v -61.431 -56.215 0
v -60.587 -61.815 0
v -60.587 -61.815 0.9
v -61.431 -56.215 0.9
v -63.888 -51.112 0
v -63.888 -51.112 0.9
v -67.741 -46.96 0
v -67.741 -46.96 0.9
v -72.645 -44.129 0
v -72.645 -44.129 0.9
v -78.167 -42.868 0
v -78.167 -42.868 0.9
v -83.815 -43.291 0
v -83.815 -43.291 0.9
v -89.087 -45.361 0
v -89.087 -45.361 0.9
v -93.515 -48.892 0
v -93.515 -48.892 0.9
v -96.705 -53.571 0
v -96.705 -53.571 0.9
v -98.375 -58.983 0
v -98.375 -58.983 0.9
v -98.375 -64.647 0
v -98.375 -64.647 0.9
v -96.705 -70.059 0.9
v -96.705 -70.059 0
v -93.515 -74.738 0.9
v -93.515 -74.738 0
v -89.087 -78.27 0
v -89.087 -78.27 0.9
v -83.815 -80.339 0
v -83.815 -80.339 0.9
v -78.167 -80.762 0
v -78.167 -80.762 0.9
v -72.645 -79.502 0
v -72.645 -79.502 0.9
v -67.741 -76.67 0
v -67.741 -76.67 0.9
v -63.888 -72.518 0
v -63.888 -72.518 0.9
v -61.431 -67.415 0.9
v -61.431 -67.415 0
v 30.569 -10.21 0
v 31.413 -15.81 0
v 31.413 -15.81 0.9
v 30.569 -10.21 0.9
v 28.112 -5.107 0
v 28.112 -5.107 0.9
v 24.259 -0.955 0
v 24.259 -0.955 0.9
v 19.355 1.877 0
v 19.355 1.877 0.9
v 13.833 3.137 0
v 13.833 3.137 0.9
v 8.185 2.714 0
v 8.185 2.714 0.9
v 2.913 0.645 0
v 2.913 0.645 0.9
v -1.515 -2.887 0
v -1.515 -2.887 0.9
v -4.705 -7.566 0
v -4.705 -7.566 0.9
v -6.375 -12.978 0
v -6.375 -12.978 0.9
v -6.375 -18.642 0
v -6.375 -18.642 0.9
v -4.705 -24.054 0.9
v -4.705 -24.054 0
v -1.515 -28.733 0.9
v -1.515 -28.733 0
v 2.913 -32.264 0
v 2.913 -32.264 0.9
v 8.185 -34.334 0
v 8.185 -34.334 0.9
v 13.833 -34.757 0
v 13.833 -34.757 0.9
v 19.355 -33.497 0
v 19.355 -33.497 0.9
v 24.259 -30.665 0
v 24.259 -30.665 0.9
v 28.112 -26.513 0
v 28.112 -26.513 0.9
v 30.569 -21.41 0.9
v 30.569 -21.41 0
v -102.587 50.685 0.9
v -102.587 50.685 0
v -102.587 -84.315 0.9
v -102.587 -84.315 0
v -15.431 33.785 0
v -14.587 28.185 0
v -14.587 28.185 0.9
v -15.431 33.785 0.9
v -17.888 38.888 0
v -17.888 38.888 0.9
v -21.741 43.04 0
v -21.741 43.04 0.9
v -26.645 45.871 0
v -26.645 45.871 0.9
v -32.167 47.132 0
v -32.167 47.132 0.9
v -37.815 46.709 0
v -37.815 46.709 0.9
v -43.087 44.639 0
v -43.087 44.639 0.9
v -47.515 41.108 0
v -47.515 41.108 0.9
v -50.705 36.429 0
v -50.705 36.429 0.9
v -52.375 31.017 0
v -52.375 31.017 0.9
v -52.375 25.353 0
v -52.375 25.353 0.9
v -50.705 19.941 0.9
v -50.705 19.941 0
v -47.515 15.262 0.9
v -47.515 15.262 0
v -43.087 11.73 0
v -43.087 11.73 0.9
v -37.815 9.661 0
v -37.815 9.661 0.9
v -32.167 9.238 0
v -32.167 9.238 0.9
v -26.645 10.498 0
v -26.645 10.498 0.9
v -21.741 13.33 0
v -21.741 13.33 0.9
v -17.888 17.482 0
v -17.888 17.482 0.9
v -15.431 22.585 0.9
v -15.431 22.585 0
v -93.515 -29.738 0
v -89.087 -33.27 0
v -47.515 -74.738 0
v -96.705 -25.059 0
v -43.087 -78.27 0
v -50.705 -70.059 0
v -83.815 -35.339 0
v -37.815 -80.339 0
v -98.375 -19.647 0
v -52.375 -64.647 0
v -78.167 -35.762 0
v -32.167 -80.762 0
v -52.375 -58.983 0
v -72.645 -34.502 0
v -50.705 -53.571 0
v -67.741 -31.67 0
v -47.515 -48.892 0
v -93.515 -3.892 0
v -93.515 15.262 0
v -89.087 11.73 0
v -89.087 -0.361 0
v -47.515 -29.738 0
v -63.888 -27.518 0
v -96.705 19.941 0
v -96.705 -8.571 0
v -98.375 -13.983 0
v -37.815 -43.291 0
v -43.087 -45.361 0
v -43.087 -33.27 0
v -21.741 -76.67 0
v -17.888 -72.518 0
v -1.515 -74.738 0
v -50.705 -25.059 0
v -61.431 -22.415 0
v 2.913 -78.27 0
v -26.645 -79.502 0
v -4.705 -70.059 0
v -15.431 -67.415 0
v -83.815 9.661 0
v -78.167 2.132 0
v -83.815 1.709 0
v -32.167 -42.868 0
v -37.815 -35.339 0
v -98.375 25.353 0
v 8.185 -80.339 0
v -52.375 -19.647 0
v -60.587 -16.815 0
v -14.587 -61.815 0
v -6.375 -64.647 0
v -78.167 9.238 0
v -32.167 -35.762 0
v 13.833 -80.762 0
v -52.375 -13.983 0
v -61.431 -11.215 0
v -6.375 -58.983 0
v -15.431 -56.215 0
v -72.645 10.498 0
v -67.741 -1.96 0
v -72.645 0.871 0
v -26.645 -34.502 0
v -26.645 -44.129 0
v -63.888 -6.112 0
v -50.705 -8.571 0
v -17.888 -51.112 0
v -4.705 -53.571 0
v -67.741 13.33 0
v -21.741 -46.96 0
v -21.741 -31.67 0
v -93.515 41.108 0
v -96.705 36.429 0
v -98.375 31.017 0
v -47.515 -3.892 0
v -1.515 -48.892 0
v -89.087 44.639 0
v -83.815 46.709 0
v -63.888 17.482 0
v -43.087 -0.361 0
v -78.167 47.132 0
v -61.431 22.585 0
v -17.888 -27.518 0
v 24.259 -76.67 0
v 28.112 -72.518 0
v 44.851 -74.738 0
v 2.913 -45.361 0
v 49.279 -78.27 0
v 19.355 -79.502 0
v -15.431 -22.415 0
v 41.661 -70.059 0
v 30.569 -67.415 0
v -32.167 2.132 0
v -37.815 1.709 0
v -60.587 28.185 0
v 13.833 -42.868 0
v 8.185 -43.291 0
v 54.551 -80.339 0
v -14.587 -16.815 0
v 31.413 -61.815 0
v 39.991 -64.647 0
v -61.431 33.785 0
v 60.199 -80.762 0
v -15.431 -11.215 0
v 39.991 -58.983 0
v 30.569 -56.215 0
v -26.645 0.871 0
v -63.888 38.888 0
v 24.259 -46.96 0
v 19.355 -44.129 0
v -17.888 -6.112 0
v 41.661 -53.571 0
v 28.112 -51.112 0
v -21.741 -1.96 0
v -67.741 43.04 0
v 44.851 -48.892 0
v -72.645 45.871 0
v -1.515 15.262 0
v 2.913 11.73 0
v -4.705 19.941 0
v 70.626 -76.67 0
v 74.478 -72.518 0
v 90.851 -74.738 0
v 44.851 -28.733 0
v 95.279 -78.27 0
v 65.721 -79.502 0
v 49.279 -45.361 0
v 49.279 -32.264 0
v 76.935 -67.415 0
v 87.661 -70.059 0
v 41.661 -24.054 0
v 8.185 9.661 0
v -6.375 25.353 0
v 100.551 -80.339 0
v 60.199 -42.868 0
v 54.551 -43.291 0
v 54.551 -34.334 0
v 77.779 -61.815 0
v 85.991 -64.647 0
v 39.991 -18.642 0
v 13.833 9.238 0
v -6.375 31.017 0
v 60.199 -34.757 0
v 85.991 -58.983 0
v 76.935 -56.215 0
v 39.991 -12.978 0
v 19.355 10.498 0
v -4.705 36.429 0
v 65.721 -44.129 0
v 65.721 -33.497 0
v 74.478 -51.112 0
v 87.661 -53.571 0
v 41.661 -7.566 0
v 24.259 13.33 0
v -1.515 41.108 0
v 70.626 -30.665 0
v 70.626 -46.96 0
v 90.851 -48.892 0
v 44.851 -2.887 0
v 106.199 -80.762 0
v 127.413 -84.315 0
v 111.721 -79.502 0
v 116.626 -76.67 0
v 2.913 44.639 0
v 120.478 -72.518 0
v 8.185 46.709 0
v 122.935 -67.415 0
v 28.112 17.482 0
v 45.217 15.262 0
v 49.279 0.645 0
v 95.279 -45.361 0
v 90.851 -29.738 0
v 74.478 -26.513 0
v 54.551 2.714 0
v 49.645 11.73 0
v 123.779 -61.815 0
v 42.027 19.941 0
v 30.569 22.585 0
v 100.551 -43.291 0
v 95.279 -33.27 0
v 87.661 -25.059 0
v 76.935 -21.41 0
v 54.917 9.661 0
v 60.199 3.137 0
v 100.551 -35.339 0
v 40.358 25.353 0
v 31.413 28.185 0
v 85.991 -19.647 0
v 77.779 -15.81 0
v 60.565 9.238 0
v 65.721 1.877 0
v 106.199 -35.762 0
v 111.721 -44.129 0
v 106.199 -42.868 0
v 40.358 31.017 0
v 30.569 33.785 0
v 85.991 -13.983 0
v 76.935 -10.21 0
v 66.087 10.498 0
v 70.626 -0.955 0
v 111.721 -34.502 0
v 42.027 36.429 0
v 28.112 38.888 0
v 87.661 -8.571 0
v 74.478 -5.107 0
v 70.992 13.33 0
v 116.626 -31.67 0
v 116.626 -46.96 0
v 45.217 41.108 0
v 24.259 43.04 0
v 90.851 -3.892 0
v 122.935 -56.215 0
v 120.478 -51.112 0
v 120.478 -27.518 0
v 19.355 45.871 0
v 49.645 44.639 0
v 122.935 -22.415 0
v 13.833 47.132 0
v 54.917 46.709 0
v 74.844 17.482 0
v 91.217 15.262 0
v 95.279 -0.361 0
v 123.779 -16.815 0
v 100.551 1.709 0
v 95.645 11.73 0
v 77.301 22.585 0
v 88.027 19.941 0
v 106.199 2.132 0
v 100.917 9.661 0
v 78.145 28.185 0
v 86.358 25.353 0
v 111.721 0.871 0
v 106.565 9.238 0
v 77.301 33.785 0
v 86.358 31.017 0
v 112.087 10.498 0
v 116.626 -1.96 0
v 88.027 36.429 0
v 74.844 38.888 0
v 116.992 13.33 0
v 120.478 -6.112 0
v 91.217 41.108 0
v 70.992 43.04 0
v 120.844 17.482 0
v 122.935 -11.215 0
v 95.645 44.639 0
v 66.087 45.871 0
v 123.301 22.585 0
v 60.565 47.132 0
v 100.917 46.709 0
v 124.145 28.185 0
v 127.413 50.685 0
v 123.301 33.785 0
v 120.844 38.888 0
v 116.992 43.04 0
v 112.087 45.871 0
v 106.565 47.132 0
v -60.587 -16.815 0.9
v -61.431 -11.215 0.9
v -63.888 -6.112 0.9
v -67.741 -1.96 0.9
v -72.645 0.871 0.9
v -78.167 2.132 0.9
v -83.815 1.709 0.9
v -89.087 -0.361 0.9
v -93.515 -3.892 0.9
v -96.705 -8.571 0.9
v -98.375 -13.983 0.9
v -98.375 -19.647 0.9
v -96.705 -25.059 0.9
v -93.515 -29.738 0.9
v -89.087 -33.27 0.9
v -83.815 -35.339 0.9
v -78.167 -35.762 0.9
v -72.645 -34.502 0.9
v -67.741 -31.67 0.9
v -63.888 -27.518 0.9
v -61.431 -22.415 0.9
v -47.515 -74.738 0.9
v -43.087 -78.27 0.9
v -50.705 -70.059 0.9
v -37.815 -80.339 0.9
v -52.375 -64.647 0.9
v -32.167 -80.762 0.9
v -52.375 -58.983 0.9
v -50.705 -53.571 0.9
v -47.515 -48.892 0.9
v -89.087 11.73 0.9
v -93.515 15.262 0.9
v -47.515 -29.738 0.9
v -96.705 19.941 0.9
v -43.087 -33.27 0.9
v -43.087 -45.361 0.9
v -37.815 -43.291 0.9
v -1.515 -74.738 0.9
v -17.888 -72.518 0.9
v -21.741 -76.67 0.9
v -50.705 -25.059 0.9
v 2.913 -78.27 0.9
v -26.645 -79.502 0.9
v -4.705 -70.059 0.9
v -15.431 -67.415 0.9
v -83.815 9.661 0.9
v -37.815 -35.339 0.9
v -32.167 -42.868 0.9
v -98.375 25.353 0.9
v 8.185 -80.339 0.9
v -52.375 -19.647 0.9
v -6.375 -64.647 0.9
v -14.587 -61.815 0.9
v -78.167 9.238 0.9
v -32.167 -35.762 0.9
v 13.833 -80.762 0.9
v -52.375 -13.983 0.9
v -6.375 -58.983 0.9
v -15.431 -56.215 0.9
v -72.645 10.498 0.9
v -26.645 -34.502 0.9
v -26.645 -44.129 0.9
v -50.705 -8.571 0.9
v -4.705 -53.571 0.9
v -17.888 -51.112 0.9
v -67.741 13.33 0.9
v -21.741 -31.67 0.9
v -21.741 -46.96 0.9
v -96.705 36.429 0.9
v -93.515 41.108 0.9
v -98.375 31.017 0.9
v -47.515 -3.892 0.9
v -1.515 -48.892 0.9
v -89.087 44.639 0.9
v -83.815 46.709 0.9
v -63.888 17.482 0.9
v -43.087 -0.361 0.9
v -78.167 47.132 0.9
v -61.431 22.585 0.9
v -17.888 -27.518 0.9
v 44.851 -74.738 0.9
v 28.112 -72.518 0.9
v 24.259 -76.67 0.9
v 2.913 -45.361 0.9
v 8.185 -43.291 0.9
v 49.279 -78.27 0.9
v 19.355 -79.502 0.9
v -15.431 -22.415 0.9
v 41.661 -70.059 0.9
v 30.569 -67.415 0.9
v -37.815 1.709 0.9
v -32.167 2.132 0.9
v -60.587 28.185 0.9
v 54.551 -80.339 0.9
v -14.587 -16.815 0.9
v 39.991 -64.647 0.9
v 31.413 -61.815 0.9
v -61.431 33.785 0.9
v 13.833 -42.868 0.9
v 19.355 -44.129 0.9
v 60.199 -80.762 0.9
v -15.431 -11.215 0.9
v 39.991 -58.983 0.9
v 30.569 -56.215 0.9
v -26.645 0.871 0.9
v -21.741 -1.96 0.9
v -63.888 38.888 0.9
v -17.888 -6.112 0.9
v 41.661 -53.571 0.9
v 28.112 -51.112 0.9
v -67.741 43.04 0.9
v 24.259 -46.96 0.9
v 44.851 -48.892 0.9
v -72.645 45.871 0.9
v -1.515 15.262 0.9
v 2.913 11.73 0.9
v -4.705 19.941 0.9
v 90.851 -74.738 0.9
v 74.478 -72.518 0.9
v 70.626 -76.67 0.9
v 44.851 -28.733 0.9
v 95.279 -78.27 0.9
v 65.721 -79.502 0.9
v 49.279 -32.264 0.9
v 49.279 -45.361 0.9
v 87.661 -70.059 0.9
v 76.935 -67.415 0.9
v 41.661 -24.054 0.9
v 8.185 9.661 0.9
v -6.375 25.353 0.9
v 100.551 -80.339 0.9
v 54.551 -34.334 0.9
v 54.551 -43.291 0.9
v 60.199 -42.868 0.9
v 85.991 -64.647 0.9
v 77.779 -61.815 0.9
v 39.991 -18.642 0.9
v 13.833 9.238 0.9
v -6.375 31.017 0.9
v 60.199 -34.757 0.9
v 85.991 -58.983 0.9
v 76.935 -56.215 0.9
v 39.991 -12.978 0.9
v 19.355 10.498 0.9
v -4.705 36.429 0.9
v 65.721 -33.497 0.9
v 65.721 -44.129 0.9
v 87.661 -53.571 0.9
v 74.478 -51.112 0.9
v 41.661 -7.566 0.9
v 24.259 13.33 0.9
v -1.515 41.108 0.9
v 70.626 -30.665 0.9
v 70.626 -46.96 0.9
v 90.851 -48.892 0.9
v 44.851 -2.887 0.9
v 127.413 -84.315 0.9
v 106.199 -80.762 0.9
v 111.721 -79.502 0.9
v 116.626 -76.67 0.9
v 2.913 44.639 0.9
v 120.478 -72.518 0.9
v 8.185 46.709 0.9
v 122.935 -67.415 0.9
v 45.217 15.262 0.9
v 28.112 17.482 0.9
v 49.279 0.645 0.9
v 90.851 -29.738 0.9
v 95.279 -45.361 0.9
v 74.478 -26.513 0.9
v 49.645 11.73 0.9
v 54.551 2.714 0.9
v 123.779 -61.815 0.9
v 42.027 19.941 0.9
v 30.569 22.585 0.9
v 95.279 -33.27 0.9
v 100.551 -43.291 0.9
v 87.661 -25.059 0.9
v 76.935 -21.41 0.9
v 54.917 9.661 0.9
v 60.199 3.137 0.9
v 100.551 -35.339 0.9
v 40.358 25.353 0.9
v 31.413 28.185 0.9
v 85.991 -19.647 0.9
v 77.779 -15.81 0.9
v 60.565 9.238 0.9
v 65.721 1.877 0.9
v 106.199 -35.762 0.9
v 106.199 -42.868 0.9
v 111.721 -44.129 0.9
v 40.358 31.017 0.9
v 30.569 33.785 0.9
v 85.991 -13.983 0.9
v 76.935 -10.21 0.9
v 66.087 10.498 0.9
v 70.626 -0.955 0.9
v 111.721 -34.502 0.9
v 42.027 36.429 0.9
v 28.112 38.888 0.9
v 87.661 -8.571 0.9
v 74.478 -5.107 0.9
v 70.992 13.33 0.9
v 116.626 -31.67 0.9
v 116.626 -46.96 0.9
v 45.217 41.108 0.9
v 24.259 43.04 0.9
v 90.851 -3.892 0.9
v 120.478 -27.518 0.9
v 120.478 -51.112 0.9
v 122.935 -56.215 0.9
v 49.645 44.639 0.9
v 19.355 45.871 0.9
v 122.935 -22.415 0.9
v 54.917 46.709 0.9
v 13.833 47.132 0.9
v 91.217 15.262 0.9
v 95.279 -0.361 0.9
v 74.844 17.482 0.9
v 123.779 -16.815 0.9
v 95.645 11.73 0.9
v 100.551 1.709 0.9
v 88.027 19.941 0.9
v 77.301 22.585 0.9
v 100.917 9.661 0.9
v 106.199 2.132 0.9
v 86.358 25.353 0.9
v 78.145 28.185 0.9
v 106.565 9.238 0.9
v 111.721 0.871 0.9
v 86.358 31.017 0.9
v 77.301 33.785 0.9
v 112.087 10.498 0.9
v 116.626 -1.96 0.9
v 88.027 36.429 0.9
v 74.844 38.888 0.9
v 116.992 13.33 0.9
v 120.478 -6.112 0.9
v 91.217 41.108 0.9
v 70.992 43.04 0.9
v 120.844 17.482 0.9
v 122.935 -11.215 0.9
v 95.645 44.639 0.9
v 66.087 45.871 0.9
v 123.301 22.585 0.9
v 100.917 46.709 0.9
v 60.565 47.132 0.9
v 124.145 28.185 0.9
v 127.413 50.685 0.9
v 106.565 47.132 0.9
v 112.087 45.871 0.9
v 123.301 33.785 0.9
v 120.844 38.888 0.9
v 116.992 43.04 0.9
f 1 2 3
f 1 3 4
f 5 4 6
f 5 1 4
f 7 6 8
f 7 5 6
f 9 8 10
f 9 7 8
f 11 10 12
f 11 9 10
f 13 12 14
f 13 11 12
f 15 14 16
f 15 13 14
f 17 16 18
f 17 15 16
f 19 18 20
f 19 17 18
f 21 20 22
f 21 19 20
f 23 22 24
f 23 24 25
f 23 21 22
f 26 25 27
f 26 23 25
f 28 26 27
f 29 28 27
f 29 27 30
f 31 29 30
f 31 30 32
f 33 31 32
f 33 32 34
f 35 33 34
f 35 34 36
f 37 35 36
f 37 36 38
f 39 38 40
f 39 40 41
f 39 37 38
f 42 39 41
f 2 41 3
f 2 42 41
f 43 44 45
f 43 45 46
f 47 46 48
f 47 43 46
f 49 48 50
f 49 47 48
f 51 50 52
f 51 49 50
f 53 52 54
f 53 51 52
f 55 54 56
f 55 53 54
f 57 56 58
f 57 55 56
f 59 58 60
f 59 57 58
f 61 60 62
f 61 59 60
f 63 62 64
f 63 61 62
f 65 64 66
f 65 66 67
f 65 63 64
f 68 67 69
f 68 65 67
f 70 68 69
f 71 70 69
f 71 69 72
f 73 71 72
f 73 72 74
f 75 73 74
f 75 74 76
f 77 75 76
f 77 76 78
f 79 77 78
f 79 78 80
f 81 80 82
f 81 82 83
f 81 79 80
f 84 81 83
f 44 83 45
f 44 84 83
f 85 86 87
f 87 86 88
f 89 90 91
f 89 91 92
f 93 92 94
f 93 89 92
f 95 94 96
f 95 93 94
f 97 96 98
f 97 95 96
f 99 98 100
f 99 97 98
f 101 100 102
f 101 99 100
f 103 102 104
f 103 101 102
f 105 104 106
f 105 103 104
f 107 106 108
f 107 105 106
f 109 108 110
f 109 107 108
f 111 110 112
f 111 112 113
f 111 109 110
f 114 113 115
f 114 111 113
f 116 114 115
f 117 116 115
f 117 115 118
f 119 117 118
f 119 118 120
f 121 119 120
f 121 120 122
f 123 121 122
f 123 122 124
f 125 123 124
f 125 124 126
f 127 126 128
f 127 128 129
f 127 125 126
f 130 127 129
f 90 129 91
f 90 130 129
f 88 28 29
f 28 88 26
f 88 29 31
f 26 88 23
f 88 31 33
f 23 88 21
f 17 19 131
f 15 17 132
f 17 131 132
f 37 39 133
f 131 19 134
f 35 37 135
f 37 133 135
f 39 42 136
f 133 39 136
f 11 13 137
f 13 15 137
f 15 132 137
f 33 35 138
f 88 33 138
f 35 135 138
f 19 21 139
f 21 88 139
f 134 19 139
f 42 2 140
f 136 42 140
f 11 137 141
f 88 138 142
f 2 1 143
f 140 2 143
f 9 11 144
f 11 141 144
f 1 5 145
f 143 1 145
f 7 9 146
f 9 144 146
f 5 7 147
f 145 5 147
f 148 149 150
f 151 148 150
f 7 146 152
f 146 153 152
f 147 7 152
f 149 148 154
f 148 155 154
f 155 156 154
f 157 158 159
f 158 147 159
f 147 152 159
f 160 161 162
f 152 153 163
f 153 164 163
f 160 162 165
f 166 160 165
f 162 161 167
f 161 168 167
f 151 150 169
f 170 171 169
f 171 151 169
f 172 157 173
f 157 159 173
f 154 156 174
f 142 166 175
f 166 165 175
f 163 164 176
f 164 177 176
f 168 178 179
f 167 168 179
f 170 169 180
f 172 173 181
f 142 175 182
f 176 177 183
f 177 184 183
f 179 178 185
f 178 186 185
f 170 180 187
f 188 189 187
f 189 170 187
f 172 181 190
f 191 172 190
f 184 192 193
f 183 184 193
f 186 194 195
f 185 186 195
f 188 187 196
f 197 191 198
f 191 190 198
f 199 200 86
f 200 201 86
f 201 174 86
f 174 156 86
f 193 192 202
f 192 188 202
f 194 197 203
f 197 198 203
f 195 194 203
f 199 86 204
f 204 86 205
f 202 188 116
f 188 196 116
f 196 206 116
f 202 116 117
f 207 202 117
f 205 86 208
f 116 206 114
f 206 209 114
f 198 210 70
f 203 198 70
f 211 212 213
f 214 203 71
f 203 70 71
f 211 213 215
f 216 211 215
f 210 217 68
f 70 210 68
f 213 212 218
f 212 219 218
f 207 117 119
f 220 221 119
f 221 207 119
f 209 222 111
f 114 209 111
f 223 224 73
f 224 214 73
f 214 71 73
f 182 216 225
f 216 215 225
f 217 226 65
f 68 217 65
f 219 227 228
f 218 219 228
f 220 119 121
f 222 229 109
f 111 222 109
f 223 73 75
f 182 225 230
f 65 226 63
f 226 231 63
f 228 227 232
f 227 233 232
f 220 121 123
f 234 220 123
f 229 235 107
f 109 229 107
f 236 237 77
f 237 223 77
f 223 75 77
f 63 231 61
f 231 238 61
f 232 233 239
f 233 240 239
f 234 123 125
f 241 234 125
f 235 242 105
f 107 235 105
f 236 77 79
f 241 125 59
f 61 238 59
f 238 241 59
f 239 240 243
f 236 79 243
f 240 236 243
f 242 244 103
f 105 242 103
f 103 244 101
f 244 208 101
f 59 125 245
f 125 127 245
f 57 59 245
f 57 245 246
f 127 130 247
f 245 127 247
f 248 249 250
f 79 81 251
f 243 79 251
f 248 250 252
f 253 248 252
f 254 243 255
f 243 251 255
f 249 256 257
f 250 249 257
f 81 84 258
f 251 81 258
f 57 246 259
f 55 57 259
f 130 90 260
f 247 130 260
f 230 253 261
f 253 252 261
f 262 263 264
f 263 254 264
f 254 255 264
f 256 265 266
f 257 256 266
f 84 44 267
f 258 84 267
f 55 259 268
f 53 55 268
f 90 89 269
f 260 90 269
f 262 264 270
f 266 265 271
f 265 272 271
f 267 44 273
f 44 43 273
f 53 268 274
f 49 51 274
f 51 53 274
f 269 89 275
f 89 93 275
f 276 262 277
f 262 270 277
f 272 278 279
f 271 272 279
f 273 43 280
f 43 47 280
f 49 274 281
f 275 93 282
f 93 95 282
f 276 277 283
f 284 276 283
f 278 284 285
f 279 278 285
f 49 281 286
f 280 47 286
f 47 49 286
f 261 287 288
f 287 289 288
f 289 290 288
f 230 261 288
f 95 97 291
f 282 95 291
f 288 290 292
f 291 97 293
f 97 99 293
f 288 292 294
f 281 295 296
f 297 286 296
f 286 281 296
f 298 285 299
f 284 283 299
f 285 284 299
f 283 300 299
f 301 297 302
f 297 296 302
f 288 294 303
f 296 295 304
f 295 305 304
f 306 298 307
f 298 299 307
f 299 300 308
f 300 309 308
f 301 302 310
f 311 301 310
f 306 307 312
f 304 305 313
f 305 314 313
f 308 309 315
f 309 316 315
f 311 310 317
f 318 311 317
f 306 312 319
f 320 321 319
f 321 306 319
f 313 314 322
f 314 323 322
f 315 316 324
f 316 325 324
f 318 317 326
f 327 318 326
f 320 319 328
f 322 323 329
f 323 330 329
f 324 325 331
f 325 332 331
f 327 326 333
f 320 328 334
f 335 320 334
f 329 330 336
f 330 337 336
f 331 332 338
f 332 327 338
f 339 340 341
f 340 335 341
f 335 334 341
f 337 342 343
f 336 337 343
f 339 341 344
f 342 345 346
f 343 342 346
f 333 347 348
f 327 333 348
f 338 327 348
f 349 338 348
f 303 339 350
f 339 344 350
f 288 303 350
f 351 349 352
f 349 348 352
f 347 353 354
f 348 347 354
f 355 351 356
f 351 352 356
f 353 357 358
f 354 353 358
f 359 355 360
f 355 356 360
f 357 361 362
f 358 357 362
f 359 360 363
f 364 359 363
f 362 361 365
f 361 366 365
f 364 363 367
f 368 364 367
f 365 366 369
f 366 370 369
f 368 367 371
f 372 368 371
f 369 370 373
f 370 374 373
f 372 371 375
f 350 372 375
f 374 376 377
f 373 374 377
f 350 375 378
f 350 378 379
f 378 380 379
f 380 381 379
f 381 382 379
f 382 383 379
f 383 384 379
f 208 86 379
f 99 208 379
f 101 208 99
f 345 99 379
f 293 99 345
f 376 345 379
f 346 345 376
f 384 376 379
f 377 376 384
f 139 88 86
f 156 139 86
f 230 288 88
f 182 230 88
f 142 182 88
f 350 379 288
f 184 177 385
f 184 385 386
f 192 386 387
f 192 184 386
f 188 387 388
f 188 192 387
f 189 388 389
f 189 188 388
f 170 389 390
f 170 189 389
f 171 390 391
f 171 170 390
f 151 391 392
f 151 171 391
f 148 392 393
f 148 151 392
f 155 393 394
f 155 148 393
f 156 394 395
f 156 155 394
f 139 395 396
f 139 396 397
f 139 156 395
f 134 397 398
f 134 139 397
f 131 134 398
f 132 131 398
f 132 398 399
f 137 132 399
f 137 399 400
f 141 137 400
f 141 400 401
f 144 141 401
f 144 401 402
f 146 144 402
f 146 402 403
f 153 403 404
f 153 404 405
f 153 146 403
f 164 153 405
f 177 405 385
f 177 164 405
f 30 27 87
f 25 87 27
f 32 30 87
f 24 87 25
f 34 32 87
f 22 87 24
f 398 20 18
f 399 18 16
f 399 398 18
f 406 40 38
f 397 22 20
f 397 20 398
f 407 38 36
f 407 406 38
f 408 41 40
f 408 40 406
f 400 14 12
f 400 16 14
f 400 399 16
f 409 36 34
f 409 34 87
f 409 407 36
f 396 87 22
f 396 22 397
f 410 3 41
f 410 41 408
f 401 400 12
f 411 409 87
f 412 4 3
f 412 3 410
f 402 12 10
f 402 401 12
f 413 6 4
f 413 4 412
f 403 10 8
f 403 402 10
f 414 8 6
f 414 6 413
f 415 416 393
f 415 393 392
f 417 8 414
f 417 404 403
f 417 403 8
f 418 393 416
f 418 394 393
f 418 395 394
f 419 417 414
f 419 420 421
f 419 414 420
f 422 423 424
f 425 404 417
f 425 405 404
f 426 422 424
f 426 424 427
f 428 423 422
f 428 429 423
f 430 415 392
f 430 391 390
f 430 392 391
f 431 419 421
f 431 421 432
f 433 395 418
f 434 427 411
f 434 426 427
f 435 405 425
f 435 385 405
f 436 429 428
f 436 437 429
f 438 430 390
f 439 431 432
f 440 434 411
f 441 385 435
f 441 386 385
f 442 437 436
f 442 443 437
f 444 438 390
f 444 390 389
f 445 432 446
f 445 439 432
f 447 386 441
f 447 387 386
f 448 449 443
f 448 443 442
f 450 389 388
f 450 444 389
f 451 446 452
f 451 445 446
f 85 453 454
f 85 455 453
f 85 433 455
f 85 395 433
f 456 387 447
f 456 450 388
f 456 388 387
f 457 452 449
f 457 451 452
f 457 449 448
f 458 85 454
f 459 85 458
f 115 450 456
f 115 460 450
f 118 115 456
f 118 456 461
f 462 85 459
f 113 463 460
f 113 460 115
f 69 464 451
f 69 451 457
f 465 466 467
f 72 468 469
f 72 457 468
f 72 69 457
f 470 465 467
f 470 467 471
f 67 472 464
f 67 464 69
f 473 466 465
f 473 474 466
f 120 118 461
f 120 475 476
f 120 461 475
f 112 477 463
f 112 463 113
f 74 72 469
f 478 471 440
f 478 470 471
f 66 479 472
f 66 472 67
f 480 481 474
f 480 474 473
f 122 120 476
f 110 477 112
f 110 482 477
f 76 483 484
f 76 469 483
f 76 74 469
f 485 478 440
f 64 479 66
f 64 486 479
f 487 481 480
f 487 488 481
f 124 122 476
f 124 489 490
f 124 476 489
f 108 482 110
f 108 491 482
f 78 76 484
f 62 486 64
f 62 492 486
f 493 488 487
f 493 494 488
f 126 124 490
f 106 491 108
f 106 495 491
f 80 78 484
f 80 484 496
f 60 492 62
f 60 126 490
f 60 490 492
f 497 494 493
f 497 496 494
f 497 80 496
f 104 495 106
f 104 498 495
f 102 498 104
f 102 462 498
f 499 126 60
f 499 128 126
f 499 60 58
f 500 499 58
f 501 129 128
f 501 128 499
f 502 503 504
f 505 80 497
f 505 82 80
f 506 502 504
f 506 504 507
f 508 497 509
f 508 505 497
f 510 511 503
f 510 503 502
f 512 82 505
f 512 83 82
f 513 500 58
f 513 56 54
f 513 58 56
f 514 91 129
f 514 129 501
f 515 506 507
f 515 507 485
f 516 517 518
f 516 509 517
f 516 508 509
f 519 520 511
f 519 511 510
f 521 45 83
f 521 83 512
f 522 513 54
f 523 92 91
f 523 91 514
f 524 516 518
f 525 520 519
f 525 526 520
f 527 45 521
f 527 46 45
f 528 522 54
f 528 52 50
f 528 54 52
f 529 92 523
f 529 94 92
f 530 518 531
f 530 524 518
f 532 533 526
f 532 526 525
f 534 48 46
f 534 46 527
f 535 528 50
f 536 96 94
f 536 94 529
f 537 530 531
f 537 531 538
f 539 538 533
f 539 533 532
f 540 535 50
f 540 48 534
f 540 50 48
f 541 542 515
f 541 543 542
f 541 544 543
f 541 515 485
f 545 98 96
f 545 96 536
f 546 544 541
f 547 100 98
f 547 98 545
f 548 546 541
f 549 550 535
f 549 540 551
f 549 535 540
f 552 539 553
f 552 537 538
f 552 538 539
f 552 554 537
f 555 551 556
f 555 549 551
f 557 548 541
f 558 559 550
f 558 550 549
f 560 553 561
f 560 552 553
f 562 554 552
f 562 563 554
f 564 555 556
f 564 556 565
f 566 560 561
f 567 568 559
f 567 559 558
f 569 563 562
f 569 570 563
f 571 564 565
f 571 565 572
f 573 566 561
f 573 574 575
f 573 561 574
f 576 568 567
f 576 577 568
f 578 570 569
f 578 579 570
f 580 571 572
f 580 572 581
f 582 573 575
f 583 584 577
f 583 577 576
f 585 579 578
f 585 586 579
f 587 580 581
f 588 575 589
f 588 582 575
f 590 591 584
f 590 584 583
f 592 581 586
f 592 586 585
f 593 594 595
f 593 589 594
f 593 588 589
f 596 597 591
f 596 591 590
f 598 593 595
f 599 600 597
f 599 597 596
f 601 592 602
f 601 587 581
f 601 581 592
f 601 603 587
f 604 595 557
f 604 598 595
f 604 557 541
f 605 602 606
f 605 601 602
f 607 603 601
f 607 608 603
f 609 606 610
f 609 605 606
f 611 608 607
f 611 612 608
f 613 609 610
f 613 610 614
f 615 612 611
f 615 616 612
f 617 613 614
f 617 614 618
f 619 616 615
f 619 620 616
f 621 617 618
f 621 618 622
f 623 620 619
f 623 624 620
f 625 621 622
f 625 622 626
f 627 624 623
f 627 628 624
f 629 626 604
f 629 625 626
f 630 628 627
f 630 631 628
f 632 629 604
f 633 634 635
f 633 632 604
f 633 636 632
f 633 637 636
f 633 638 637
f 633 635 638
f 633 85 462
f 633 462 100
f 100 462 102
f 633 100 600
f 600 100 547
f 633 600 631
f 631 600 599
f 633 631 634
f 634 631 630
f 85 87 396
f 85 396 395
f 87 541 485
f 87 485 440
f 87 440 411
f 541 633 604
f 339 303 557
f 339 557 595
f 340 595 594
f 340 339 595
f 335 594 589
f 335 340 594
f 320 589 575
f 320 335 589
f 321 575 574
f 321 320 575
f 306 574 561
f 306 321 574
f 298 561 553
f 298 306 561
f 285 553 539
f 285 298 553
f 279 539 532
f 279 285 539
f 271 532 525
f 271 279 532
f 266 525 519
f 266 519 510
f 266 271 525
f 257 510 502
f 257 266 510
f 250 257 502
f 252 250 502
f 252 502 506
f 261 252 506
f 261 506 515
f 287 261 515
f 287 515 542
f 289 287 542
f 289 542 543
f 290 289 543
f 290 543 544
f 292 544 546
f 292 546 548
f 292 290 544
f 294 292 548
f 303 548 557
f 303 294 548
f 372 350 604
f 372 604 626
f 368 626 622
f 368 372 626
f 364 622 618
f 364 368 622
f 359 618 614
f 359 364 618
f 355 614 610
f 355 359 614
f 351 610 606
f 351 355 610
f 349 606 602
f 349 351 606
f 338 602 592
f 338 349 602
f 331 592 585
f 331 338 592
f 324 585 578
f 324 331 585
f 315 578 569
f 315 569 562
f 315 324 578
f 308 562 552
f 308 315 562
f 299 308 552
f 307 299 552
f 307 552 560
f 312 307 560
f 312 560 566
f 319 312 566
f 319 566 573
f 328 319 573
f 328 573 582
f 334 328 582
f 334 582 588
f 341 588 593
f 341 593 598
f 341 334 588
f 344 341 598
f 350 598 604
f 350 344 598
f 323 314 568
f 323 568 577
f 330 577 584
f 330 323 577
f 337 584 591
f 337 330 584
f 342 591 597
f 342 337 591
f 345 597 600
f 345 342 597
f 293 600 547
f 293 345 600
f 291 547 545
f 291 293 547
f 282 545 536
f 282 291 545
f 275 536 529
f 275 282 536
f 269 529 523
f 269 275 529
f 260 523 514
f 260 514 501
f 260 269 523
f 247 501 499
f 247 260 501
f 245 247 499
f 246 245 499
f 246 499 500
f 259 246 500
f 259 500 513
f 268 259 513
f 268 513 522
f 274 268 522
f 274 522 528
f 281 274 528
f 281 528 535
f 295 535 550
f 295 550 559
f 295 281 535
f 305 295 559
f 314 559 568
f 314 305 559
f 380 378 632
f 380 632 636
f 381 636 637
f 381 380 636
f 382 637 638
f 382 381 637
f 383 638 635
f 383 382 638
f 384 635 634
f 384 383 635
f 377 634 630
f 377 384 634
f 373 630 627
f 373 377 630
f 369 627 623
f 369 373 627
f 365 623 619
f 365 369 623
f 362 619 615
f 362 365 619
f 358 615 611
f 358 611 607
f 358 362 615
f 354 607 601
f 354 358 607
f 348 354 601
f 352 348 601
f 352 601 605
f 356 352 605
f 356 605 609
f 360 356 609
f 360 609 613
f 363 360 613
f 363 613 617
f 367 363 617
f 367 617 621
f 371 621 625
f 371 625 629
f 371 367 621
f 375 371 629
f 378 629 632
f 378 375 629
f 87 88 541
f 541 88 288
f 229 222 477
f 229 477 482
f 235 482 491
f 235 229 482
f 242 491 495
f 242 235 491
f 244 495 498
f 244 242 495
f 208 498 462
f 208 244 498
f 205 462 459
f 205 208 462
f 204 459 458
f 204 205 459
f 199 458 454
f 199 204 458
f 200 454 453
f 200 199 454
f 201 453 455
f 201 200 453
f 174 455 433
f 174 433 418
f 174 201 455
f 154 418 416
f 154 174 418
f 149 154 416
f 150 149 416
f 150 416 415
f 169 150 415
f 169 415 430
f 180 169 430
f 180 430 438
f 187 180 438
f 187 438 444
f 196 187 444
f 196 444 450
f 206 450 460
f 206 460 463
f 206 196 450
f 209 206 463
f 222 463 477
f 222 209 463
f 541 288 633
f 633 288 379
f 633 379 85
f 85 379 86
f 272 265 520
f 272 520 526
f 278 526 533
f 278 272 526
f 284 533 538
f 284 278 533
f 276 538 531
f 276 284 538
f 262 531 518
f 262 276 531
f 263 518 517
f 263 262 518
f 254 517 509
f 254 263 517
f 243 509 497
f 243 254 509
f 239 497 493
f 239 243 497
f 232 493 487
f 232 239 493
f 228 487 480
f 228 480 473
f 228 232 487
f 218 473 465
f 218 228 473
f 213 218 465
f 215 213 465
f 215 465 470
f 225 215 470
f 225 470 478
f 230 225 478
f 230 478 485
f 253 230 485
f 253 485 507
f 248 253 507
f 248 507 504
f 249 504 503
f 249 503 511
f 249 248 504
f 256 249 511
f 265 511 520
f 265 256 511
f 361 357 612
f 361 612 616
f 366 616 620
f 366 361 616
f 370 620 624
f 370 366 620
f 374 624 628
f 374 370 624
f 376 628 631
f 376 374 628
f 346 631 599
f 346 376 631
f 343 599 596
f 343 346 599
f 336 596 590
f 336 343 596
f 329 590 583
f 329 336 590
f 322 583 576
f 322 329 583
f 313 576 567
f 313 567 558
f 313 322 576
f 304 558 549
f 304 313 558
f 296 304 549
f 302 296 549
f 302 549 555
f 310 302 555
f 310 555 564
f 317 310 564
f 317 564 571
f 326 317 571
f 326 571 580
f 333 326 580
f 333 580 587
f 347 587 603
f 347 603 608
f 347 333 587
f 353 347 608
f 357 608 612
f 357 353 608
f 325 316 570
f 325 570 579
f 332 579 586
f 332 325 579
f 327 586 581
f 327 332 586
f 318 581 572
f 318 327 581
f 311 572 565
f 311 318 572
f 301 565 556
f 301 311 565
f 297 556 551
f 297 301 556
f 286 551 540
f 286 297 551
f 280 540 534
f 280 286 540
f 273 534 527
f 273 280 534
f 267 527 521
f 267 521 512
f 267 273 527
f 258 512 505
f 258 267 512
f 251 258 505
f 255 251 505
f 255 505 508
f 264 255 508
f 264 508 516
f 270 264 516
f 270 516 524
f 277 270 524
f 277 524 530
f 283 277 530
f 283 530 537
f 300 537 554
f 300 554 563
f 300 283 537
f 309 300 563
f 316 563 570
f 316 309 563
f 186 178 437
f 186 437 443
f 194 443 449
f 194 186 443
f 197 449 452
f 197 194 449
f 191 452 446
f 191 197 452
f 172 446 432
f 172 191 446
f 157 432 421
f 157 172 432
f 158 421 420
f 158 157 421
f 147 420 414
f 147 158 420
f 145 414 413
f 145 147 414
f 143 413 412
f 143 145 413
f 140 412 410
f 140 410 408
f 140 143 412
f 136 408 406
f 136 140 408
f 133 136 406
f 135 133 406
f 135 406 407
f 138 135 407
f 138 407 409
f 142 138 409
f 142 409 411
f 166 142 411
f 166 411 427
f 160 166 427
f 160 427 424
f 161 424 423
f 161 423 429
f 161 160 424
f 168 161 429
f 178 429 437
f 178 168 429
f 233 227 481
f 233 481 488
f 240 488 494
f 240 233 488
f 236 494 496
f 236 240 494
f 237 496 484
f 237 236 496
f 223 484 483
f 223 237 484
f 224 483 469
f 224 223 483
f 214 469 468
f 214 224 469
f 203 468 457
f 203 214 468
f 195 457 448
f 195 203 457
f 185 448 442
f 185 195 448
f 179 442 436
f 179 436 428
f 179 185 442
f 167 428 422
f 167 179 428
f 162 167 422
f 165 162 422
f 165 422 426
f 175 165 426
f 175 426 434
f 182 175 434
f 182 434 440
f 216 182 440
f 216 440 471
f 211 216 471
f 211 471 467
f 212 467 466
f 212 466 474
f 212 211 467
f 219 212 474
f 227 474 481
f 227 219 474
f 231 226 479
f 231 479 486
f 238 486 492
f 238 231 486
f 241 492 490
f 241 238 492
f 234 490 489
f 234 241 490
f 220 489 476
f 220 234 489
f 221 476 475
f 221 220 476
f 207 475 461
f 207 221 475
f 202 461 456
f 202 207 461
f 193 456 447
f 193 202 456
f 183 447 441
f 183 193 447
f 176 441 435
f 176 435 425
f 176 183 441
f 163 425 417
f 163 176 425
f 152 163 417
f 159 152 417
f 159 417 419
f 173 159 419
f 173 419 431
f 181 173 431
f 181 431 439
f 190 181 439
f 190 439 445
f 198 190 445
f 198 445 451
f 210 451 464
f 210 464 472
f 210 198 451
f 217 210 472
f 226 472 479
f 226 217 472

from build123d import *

# Parameters (mm, degrees)
F0_R     = 19
F0_R_2   = 2.5
F1_DEPTH = 0.9
F3_DEPTH = 0.9


# Not quite as in the source:
# - the program builds the solid bodies; features that only make, move or delete a surface that nothing else refers to are left out


with BuildPart() as f1:
    # F0 (on Top) → F1 (new body)
    with BuildSketch(Plane.XY):
        Polygon((127.4130453914, 50.6848765003), (-102.5869546086, 50.6848765003), (-102.5869546086, 5.6848765003), (-102.5869546086, -39.3151234997), (-102.5869546086, -84.3151234997), (-56.5869546086, -84.3151234997), (-10.5869546086, -84.3151234997), (35.4130453914, -84.3151234997), (81.4130453914, -84.3151234997), (127.4130453914, -84.3151234997), align=None)
        with Locations((-79.5869546086, -61.8151234997)):
            Circle(F0_R, mode=Mode.SUBTRACT)
        with Locations((-33.5869546086, -61.8151234997)):
            Circle(F0_R, mode=Mode.SUBTRACT)
        with Locations((12.4130453914, -61.8151234997)):
            Circle(F0_R, mode=Mode.SUBTRACT)
        with Locations((-56.5869546086, -39.3151234997)):
            Circle(F0_R_2, mode=Mode.SUBTRACT)
        with Locations((-10.5869546086, -39.3151234997)):
            Circle(F0_R_2, mode=Mode.SUBTRACT)
        with Locations((58.7792091643, -61.8151234997)):
            Circle(F0_R, mode=Mode.SUBTRACT)
        with Locations((104.7792091643, -61.8151234997)):
            Circle(F0_R, mode=Mode.SUBTRACT)
        with Locations((35.4130453914, -39.3151234997)):
            Circle(F0_R_2, mode=Mode.SUBTRACT)
        with Locations((81.4130453914, -39.3151234997)):
            Circle(F0_R_2, mode=Mode.SUBTRACT)
        with Locations((-79.5869546086, -16.8151234997)):
            Circle(F0_R, mode=Mode.SUBTRACT)
        with Locations((-56.5869546086, 5.6848765003)):
            Circle(F0_R_2, mode=Mode.SUBTRACT)
        with Locations((-33.5869546086, -16.8151234997)):
            Circle(F0_R, mode=Mode.SUBTRACT)
        with Locations((12.4130453914, -15.8099713178)):
            Circle(F0_R, mode=Mode.SUBTRACT)
        with Locations((-10.5869546086, 5.6848765003)):
            Circle(F0_R_2, mode=Mode.SUBTRACT)
        with Locations((-79.5869546086, 28.1848765003)):
            Circle(F0_R, mode=Mode.SUBTRACT)
        with Locations((-33.5869546086, 28.1848765003)):
            Circle(F0_R, mode=Mode.SUBTRACT)
        with Locations((12.4130453914, 28.1848765003)):
            Circle(F0_R, mode=Mode.SUBTRACT)
        with Locations((58.7792091643, -15.8099713178)):
            Circle(F0_R, mode=Mode.SUBTRACT)
        with Locations((35.4130453914, 5.6848765003)):
            Circle(F0_R_2, mode=Mode.SUBTRACT)
        with Locations((104.7792091643, -16.8151234997)):
            Circle(F0_R, mode=Mode.SUBTRACT)
        with Locations((81.4130453914, 5.6848765003)):
            Circle(F0_R_2, mode=Mode.SUBTRACT)
        with Locations((59.1453729371, 28.1848765003)):
            Circle(F0_R, mode=Mode.SUBTRACT)
        with Locations((105.1453729371, 28.1848765003)):
            Circle(F0_R, mode=Mode.SUBTRACT)
    extrude(amount=F1_DEPTH)

    # F0 (on Top) → F3 (join)
    with BuildSketch(Plane.XY):
        with Locations((35.4130453914, -39.3151234997)):
            Circle(F0_R_2)
        with Locations((81.4130453914, -39.3151234997)):
            Circle(F0_R_2)
        with Locations((81.4130453914, 5.6848765003)):
            Circle(F0_R_2)
        with Locations((35.4130453914, 5.6848765003)):
            Circle(F0_R_2)
        with Locations((-10.5869546086, 5.6848765003)):
            Circle(F0_R_2)
        with Locations((-56.5869546086, 5.6848765003)):
            Circle(F0_R_2)
        with Locations((-56.5869546086, -39.3151234997)):
            Circle(F0_R_2)
        with Locations((-10.5869546086, -39.3151234997)):
            Circle(F0_R_2)
    extrude(amount=F3_DEPTH)


solid = f1.part
